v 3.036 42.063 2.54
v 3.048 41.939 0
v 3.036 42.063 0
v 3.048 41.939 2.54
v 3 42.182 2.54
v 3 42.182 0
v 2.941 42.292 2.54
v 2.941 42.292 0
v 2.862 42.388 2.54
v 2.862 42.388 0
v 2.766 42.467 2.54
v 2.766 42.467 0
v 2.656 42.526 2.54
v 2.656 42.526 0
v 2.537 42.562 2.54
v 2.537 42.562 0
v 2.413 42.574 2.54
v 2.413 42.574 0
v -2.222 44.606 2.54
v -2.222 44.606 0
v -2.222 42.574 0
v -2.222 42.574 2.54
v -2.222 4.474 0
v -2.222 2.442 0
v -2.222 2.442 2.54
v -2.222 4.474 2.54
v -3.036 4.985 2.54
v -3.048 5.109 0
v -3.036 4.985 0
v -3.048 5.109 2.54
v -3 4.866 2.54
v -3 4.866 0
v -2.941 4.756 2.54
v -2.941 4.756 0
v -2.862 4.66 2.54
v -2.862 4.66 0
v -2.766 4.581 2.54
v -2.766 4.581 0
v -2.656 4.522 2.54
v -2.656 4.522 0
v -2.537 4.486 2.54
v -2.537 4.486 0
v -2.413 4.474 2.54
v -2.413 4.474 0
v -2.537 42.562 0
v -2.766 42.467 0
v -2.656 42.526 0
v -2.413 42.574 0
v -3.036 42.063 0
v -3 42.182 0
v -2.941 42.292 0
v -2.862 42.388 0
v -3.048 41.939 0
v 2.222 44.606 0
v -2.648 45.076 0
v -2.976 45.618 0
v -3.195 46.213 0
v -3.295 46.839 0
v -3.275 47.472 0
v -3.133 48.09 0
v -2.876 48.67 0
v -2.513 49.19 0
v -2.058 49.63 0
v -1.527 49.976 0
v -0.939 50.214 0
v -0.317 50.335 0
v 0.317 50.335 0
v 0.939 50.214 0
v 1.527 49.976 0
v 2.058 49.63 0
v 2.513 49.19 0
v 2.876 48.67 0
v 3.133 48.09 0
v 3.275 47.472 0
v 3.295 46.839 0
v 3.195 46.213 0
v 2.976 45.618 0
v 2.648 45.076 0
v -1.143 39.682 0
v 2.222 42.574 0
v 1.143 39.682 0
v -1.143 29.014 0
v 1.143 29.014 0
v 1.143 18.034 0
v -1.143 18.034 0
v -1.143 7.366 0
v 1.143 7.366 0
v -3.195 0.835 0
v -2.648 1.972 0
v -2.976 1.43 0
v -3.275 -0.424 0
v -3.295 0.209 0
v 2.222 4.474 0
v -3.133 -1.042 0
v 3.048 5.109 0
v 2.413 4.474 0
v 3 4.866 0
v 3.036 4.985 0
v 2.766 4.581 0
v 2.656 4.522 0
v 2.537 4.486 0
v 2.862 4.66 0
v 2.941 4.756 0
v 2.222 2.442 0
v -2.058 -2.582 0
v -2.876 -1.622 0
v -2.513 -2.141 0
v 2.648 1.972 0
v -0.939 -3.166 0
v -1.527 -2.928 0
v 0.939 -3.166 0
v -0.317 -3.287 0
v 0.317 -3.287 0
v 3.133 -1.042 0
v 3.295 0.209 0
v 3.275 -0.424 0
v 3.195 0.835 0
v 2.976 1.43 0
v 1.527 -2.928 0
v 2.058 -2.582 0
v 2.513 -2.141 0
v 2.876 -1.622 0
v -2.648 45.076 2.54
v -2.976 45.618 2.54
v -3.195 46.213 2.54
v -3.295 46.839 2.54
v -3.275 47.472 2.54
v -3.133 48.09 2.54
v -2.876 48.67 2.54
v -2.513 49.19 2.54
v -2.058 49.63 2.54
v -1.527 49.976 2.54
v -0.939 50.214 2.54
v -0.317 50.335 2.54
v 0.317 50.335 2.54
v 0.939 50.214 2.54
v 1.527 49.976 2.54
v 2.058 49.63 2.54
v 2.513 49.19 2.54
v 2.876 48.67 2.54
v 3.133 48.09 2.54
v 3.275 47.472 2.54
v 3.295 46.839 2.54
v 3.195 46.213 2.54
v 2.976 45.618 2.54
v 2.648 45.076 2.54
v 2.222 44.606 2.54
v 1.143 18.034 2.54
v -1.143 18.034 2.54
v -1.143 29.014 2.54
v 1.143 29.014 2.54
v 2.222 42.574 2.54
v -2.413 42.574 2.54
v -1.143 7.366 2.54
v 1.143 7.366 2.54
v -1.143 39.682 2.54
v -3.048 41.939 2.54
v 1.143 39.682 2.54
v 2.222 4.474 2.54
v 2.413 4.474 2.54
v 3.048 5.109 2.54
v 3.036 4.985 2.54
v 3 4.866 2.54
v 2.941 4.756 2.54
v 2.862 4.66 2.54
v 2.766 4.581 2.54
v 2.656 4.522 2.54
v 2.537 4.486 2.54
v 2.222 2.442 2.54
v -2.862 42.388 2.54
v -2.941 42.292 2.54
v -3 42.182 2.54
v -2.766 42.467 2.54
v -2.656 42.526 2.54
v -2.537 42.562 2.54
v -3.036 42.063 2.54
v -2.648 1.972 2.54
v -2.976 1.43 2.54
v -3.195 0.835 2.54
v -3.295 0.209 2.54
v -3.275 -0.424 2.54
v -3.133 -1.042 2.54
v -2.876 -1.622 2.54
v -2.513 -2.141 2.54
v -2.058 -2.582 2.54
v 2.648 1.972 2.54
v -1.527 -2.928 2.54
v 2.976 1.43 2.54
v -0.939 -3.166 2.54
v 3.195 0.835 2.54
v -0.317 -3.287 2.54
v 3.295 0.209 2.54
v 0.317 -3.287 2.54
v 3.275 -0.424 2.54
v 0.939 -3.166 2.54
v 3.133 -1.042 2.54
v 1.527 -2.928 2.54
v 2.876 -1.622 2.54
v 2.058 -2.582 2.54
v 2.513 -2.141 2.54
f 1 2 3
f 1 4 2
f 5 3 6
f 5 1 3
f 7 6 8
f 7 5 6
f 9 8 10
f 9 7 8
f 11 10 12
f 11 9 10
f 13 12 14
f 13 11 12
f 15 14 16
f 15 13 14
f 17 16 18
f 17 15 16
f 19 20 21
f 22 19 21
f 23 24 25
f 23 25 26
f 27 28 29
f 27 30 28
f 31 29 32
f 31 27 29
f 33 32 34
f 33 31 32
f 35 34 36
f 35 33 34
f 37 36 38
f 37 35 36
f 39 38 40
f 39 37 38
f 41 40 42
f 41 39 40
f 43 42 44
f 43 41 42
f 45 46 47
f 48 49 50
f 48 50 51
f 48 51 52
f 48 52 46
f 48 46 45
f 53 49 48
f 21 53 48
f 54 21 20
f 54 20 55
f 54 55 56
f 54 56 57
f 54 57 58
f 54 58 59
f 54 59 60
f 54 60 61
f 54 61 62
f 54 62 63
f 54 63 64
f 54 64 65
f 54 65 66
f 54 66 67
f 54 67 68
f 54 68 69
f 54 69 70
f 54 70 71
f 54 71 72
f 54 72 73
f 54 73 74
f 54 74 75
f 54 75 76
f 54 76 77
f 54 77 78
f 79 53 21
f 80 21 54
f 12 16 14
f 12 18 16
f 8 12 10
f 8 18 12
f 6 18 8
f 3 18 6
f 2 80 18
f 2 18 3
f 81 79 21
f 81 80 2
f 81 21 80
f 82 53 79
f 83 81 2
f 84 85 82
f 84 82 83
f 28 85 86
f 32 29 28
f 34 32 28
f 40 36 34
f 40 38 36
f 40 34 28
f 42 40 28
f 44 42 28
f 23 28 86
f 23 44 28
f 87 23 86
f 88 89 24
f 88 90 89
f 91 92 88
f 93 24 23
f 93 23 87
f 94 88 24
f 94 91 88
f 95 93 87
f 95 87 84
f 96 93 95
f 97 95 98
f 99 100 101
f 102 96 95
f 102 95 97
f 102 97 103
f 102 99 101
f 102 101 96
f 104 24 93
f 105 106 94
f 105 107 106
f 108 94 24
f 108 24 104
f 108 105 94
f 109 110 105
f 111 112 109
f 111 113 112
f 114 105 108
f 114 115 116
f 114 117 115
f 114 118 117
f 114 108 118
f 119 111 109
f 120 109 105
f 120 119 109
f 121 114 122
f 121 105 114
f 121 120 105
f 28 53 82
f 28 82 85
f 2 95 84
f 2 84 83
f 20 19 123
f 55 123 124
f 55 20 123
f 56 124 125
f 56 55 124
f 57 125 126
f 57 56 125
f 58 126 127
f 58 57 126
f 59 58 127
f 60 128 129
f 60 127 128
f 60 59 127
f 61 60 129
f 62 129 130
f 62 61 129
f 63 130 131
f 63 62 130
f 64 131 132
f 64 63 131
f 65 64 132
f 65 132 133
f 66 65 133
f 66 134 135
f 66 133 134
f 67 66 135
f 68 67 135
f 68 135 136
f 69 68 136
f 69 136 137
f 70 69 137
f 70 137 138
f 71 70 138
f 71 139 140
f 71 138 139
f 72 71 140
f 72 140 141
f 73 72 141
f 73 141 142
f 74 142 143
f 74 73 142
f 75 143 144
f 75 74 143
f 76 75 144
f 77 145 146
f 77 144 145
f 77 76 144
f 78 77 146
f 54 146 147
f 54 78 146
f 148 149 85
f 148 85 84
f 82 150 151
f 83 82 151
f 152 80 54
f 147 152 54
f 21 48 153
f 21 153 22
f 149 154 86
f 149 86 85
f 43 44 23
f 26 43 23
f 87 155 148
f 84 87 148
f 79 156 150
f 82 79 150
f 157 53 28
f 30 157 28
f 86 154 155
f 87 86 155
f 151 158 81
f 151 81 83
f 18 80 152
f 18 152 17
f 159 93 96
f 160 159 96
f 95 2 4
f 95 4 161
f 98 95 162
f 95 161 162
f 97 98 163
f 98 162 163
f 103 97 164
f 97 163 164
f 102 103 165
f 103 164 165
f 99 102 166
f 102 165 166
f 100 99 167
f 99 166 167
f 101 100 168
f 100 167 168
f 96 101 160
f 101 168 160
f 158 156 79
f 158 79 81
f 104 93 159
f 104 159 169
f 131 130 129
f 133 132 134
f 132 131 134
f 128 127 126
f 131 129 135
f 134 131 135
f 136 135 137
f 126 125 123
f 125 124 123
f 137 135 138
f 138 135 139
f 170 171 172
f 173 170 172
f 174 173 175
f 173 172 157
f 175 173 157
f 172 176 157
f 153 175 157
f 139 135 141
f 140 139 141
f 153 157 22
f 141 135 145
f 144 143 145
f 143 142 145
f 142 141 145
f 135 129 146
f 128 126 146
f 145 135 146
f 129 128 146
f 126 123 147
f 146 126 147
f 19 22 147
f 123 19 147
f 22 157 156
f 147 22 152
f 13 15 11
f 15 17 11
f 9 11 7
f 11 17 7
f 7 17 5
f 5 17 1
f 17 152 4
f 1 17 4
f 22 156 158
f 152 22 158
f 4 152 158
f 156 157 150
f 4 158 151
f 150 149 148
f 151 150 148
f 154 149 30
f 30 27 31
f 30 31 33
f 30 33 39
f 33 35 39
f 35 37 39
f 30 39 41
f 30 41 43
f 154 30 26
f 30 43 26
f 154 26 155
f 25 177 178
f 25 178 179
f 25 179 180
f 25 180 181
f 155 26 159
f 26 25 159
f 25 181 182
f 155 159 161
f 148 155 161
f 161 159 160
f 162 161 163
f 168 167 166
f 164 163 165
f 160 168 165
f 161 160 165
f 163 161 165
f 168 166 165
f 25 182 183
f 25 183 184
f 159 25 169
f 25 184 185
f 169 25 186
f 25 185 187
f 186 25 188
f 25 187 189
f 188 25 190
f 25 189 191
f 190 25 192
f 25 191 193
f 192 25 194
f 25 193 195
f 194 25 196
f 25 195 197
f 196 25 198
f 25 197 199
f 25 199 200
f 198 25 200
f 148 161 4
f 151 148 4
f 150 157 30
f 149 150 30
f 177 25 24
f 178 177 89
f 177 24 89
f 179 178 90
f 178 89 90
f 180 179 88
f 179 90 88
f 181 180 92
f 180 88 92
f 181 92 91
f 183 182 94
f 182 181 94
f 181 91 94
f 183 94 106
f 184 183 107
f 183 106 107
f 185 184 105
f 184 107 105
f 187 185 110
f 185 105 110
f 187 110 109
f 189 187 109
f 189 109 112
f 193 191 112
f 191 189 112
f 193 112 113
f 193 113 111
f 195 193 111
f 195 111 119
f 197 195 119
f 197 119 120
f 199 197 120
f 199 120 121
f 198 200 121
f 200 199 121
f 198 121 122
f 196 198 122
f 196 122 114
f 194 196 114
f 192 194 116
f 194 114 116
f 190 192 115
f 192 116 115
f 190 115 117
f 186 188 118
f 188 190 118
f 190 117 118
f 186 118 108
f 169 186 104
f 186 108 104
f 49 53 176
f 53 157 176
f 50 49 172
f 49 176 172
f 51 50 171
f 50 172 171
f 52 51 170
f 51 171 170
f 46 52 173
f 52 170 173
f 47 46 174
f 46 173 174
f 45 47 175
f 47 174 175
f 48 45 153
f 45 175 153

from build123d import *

# Parameters (mm, degrees)
F0_R     = 3.302
F1_DEPTH = 2.54
F3_DEPTH = 2.54
F4_W     = 6.096
F4_H     = 19.05
F5_DEPTH = 2.54
F6_R     = 0.635
F7_W     = 2.286
F7_H     = 10.668
F8_DEPTH = 25.4


with BuildPart() as f1:
    # F0 (on Top) → F1 (new body)
    with BuildSketch(Plane.XY):
        Circle(F0_R)
    extrude(amount=F1_DEPTH)

    # F2 (on face) → F3 (join, through all)
    with BuildSketch(Plane(origin=(0, 0, 0), x_dir=(1, 0, 0), z_dir=(0, 0, -1))):
        with BuildLine():
            ThreePointArc((2.2225, -2.442068), (0, -3.302), (-2.2225, -2.442068))
            Line((-2.2225, -2.442068), (-2.2225, -4.474068))
            Line((-2.2225, -4.474068), (2.2225, -4.474068))
            Line((2.2225, -4.474068), (2.2225, -2.442068))
        make_face()
    extrude(amount=-F3_DEPTH)

    # F4 (on Top) → F5 (join, through all)
    with BuildSketch(Plane.XY):
        with Locations((0, 13.999068)):
            Rectangle(F4_W, F4_H)
    extrude(amount=F5_DEPTH)

    # F6
    f6_edges = [f1.edges().sort_by_distance(p)[0] for p in [
        (3.048, 4.474068, 1.27),
        (-3.048, 4.474068, 1.27),
    ]]
    fillet(f6_edges, radius=F6_R)

    # F7 (on face) → F8 (cut)
    with BuildSketch(Plane.XY.offset(2.54)):
        with Locations((0, 12.7)):
            Rectangle(F7_W, F7_H)
    extrude(amount=-F8_DEPTH, mode=Mode.SUBTRACT)

    # F9: F1 across face


with BuildPart() as f1_1:
    add(f1.part)
    add(f1.part.mirror(Plane(origin=(0, 23.524068, 1.27), x_dir=(-1, 0, 0), z_dir=(0, 1, 0))))


solid = f1_1.part
